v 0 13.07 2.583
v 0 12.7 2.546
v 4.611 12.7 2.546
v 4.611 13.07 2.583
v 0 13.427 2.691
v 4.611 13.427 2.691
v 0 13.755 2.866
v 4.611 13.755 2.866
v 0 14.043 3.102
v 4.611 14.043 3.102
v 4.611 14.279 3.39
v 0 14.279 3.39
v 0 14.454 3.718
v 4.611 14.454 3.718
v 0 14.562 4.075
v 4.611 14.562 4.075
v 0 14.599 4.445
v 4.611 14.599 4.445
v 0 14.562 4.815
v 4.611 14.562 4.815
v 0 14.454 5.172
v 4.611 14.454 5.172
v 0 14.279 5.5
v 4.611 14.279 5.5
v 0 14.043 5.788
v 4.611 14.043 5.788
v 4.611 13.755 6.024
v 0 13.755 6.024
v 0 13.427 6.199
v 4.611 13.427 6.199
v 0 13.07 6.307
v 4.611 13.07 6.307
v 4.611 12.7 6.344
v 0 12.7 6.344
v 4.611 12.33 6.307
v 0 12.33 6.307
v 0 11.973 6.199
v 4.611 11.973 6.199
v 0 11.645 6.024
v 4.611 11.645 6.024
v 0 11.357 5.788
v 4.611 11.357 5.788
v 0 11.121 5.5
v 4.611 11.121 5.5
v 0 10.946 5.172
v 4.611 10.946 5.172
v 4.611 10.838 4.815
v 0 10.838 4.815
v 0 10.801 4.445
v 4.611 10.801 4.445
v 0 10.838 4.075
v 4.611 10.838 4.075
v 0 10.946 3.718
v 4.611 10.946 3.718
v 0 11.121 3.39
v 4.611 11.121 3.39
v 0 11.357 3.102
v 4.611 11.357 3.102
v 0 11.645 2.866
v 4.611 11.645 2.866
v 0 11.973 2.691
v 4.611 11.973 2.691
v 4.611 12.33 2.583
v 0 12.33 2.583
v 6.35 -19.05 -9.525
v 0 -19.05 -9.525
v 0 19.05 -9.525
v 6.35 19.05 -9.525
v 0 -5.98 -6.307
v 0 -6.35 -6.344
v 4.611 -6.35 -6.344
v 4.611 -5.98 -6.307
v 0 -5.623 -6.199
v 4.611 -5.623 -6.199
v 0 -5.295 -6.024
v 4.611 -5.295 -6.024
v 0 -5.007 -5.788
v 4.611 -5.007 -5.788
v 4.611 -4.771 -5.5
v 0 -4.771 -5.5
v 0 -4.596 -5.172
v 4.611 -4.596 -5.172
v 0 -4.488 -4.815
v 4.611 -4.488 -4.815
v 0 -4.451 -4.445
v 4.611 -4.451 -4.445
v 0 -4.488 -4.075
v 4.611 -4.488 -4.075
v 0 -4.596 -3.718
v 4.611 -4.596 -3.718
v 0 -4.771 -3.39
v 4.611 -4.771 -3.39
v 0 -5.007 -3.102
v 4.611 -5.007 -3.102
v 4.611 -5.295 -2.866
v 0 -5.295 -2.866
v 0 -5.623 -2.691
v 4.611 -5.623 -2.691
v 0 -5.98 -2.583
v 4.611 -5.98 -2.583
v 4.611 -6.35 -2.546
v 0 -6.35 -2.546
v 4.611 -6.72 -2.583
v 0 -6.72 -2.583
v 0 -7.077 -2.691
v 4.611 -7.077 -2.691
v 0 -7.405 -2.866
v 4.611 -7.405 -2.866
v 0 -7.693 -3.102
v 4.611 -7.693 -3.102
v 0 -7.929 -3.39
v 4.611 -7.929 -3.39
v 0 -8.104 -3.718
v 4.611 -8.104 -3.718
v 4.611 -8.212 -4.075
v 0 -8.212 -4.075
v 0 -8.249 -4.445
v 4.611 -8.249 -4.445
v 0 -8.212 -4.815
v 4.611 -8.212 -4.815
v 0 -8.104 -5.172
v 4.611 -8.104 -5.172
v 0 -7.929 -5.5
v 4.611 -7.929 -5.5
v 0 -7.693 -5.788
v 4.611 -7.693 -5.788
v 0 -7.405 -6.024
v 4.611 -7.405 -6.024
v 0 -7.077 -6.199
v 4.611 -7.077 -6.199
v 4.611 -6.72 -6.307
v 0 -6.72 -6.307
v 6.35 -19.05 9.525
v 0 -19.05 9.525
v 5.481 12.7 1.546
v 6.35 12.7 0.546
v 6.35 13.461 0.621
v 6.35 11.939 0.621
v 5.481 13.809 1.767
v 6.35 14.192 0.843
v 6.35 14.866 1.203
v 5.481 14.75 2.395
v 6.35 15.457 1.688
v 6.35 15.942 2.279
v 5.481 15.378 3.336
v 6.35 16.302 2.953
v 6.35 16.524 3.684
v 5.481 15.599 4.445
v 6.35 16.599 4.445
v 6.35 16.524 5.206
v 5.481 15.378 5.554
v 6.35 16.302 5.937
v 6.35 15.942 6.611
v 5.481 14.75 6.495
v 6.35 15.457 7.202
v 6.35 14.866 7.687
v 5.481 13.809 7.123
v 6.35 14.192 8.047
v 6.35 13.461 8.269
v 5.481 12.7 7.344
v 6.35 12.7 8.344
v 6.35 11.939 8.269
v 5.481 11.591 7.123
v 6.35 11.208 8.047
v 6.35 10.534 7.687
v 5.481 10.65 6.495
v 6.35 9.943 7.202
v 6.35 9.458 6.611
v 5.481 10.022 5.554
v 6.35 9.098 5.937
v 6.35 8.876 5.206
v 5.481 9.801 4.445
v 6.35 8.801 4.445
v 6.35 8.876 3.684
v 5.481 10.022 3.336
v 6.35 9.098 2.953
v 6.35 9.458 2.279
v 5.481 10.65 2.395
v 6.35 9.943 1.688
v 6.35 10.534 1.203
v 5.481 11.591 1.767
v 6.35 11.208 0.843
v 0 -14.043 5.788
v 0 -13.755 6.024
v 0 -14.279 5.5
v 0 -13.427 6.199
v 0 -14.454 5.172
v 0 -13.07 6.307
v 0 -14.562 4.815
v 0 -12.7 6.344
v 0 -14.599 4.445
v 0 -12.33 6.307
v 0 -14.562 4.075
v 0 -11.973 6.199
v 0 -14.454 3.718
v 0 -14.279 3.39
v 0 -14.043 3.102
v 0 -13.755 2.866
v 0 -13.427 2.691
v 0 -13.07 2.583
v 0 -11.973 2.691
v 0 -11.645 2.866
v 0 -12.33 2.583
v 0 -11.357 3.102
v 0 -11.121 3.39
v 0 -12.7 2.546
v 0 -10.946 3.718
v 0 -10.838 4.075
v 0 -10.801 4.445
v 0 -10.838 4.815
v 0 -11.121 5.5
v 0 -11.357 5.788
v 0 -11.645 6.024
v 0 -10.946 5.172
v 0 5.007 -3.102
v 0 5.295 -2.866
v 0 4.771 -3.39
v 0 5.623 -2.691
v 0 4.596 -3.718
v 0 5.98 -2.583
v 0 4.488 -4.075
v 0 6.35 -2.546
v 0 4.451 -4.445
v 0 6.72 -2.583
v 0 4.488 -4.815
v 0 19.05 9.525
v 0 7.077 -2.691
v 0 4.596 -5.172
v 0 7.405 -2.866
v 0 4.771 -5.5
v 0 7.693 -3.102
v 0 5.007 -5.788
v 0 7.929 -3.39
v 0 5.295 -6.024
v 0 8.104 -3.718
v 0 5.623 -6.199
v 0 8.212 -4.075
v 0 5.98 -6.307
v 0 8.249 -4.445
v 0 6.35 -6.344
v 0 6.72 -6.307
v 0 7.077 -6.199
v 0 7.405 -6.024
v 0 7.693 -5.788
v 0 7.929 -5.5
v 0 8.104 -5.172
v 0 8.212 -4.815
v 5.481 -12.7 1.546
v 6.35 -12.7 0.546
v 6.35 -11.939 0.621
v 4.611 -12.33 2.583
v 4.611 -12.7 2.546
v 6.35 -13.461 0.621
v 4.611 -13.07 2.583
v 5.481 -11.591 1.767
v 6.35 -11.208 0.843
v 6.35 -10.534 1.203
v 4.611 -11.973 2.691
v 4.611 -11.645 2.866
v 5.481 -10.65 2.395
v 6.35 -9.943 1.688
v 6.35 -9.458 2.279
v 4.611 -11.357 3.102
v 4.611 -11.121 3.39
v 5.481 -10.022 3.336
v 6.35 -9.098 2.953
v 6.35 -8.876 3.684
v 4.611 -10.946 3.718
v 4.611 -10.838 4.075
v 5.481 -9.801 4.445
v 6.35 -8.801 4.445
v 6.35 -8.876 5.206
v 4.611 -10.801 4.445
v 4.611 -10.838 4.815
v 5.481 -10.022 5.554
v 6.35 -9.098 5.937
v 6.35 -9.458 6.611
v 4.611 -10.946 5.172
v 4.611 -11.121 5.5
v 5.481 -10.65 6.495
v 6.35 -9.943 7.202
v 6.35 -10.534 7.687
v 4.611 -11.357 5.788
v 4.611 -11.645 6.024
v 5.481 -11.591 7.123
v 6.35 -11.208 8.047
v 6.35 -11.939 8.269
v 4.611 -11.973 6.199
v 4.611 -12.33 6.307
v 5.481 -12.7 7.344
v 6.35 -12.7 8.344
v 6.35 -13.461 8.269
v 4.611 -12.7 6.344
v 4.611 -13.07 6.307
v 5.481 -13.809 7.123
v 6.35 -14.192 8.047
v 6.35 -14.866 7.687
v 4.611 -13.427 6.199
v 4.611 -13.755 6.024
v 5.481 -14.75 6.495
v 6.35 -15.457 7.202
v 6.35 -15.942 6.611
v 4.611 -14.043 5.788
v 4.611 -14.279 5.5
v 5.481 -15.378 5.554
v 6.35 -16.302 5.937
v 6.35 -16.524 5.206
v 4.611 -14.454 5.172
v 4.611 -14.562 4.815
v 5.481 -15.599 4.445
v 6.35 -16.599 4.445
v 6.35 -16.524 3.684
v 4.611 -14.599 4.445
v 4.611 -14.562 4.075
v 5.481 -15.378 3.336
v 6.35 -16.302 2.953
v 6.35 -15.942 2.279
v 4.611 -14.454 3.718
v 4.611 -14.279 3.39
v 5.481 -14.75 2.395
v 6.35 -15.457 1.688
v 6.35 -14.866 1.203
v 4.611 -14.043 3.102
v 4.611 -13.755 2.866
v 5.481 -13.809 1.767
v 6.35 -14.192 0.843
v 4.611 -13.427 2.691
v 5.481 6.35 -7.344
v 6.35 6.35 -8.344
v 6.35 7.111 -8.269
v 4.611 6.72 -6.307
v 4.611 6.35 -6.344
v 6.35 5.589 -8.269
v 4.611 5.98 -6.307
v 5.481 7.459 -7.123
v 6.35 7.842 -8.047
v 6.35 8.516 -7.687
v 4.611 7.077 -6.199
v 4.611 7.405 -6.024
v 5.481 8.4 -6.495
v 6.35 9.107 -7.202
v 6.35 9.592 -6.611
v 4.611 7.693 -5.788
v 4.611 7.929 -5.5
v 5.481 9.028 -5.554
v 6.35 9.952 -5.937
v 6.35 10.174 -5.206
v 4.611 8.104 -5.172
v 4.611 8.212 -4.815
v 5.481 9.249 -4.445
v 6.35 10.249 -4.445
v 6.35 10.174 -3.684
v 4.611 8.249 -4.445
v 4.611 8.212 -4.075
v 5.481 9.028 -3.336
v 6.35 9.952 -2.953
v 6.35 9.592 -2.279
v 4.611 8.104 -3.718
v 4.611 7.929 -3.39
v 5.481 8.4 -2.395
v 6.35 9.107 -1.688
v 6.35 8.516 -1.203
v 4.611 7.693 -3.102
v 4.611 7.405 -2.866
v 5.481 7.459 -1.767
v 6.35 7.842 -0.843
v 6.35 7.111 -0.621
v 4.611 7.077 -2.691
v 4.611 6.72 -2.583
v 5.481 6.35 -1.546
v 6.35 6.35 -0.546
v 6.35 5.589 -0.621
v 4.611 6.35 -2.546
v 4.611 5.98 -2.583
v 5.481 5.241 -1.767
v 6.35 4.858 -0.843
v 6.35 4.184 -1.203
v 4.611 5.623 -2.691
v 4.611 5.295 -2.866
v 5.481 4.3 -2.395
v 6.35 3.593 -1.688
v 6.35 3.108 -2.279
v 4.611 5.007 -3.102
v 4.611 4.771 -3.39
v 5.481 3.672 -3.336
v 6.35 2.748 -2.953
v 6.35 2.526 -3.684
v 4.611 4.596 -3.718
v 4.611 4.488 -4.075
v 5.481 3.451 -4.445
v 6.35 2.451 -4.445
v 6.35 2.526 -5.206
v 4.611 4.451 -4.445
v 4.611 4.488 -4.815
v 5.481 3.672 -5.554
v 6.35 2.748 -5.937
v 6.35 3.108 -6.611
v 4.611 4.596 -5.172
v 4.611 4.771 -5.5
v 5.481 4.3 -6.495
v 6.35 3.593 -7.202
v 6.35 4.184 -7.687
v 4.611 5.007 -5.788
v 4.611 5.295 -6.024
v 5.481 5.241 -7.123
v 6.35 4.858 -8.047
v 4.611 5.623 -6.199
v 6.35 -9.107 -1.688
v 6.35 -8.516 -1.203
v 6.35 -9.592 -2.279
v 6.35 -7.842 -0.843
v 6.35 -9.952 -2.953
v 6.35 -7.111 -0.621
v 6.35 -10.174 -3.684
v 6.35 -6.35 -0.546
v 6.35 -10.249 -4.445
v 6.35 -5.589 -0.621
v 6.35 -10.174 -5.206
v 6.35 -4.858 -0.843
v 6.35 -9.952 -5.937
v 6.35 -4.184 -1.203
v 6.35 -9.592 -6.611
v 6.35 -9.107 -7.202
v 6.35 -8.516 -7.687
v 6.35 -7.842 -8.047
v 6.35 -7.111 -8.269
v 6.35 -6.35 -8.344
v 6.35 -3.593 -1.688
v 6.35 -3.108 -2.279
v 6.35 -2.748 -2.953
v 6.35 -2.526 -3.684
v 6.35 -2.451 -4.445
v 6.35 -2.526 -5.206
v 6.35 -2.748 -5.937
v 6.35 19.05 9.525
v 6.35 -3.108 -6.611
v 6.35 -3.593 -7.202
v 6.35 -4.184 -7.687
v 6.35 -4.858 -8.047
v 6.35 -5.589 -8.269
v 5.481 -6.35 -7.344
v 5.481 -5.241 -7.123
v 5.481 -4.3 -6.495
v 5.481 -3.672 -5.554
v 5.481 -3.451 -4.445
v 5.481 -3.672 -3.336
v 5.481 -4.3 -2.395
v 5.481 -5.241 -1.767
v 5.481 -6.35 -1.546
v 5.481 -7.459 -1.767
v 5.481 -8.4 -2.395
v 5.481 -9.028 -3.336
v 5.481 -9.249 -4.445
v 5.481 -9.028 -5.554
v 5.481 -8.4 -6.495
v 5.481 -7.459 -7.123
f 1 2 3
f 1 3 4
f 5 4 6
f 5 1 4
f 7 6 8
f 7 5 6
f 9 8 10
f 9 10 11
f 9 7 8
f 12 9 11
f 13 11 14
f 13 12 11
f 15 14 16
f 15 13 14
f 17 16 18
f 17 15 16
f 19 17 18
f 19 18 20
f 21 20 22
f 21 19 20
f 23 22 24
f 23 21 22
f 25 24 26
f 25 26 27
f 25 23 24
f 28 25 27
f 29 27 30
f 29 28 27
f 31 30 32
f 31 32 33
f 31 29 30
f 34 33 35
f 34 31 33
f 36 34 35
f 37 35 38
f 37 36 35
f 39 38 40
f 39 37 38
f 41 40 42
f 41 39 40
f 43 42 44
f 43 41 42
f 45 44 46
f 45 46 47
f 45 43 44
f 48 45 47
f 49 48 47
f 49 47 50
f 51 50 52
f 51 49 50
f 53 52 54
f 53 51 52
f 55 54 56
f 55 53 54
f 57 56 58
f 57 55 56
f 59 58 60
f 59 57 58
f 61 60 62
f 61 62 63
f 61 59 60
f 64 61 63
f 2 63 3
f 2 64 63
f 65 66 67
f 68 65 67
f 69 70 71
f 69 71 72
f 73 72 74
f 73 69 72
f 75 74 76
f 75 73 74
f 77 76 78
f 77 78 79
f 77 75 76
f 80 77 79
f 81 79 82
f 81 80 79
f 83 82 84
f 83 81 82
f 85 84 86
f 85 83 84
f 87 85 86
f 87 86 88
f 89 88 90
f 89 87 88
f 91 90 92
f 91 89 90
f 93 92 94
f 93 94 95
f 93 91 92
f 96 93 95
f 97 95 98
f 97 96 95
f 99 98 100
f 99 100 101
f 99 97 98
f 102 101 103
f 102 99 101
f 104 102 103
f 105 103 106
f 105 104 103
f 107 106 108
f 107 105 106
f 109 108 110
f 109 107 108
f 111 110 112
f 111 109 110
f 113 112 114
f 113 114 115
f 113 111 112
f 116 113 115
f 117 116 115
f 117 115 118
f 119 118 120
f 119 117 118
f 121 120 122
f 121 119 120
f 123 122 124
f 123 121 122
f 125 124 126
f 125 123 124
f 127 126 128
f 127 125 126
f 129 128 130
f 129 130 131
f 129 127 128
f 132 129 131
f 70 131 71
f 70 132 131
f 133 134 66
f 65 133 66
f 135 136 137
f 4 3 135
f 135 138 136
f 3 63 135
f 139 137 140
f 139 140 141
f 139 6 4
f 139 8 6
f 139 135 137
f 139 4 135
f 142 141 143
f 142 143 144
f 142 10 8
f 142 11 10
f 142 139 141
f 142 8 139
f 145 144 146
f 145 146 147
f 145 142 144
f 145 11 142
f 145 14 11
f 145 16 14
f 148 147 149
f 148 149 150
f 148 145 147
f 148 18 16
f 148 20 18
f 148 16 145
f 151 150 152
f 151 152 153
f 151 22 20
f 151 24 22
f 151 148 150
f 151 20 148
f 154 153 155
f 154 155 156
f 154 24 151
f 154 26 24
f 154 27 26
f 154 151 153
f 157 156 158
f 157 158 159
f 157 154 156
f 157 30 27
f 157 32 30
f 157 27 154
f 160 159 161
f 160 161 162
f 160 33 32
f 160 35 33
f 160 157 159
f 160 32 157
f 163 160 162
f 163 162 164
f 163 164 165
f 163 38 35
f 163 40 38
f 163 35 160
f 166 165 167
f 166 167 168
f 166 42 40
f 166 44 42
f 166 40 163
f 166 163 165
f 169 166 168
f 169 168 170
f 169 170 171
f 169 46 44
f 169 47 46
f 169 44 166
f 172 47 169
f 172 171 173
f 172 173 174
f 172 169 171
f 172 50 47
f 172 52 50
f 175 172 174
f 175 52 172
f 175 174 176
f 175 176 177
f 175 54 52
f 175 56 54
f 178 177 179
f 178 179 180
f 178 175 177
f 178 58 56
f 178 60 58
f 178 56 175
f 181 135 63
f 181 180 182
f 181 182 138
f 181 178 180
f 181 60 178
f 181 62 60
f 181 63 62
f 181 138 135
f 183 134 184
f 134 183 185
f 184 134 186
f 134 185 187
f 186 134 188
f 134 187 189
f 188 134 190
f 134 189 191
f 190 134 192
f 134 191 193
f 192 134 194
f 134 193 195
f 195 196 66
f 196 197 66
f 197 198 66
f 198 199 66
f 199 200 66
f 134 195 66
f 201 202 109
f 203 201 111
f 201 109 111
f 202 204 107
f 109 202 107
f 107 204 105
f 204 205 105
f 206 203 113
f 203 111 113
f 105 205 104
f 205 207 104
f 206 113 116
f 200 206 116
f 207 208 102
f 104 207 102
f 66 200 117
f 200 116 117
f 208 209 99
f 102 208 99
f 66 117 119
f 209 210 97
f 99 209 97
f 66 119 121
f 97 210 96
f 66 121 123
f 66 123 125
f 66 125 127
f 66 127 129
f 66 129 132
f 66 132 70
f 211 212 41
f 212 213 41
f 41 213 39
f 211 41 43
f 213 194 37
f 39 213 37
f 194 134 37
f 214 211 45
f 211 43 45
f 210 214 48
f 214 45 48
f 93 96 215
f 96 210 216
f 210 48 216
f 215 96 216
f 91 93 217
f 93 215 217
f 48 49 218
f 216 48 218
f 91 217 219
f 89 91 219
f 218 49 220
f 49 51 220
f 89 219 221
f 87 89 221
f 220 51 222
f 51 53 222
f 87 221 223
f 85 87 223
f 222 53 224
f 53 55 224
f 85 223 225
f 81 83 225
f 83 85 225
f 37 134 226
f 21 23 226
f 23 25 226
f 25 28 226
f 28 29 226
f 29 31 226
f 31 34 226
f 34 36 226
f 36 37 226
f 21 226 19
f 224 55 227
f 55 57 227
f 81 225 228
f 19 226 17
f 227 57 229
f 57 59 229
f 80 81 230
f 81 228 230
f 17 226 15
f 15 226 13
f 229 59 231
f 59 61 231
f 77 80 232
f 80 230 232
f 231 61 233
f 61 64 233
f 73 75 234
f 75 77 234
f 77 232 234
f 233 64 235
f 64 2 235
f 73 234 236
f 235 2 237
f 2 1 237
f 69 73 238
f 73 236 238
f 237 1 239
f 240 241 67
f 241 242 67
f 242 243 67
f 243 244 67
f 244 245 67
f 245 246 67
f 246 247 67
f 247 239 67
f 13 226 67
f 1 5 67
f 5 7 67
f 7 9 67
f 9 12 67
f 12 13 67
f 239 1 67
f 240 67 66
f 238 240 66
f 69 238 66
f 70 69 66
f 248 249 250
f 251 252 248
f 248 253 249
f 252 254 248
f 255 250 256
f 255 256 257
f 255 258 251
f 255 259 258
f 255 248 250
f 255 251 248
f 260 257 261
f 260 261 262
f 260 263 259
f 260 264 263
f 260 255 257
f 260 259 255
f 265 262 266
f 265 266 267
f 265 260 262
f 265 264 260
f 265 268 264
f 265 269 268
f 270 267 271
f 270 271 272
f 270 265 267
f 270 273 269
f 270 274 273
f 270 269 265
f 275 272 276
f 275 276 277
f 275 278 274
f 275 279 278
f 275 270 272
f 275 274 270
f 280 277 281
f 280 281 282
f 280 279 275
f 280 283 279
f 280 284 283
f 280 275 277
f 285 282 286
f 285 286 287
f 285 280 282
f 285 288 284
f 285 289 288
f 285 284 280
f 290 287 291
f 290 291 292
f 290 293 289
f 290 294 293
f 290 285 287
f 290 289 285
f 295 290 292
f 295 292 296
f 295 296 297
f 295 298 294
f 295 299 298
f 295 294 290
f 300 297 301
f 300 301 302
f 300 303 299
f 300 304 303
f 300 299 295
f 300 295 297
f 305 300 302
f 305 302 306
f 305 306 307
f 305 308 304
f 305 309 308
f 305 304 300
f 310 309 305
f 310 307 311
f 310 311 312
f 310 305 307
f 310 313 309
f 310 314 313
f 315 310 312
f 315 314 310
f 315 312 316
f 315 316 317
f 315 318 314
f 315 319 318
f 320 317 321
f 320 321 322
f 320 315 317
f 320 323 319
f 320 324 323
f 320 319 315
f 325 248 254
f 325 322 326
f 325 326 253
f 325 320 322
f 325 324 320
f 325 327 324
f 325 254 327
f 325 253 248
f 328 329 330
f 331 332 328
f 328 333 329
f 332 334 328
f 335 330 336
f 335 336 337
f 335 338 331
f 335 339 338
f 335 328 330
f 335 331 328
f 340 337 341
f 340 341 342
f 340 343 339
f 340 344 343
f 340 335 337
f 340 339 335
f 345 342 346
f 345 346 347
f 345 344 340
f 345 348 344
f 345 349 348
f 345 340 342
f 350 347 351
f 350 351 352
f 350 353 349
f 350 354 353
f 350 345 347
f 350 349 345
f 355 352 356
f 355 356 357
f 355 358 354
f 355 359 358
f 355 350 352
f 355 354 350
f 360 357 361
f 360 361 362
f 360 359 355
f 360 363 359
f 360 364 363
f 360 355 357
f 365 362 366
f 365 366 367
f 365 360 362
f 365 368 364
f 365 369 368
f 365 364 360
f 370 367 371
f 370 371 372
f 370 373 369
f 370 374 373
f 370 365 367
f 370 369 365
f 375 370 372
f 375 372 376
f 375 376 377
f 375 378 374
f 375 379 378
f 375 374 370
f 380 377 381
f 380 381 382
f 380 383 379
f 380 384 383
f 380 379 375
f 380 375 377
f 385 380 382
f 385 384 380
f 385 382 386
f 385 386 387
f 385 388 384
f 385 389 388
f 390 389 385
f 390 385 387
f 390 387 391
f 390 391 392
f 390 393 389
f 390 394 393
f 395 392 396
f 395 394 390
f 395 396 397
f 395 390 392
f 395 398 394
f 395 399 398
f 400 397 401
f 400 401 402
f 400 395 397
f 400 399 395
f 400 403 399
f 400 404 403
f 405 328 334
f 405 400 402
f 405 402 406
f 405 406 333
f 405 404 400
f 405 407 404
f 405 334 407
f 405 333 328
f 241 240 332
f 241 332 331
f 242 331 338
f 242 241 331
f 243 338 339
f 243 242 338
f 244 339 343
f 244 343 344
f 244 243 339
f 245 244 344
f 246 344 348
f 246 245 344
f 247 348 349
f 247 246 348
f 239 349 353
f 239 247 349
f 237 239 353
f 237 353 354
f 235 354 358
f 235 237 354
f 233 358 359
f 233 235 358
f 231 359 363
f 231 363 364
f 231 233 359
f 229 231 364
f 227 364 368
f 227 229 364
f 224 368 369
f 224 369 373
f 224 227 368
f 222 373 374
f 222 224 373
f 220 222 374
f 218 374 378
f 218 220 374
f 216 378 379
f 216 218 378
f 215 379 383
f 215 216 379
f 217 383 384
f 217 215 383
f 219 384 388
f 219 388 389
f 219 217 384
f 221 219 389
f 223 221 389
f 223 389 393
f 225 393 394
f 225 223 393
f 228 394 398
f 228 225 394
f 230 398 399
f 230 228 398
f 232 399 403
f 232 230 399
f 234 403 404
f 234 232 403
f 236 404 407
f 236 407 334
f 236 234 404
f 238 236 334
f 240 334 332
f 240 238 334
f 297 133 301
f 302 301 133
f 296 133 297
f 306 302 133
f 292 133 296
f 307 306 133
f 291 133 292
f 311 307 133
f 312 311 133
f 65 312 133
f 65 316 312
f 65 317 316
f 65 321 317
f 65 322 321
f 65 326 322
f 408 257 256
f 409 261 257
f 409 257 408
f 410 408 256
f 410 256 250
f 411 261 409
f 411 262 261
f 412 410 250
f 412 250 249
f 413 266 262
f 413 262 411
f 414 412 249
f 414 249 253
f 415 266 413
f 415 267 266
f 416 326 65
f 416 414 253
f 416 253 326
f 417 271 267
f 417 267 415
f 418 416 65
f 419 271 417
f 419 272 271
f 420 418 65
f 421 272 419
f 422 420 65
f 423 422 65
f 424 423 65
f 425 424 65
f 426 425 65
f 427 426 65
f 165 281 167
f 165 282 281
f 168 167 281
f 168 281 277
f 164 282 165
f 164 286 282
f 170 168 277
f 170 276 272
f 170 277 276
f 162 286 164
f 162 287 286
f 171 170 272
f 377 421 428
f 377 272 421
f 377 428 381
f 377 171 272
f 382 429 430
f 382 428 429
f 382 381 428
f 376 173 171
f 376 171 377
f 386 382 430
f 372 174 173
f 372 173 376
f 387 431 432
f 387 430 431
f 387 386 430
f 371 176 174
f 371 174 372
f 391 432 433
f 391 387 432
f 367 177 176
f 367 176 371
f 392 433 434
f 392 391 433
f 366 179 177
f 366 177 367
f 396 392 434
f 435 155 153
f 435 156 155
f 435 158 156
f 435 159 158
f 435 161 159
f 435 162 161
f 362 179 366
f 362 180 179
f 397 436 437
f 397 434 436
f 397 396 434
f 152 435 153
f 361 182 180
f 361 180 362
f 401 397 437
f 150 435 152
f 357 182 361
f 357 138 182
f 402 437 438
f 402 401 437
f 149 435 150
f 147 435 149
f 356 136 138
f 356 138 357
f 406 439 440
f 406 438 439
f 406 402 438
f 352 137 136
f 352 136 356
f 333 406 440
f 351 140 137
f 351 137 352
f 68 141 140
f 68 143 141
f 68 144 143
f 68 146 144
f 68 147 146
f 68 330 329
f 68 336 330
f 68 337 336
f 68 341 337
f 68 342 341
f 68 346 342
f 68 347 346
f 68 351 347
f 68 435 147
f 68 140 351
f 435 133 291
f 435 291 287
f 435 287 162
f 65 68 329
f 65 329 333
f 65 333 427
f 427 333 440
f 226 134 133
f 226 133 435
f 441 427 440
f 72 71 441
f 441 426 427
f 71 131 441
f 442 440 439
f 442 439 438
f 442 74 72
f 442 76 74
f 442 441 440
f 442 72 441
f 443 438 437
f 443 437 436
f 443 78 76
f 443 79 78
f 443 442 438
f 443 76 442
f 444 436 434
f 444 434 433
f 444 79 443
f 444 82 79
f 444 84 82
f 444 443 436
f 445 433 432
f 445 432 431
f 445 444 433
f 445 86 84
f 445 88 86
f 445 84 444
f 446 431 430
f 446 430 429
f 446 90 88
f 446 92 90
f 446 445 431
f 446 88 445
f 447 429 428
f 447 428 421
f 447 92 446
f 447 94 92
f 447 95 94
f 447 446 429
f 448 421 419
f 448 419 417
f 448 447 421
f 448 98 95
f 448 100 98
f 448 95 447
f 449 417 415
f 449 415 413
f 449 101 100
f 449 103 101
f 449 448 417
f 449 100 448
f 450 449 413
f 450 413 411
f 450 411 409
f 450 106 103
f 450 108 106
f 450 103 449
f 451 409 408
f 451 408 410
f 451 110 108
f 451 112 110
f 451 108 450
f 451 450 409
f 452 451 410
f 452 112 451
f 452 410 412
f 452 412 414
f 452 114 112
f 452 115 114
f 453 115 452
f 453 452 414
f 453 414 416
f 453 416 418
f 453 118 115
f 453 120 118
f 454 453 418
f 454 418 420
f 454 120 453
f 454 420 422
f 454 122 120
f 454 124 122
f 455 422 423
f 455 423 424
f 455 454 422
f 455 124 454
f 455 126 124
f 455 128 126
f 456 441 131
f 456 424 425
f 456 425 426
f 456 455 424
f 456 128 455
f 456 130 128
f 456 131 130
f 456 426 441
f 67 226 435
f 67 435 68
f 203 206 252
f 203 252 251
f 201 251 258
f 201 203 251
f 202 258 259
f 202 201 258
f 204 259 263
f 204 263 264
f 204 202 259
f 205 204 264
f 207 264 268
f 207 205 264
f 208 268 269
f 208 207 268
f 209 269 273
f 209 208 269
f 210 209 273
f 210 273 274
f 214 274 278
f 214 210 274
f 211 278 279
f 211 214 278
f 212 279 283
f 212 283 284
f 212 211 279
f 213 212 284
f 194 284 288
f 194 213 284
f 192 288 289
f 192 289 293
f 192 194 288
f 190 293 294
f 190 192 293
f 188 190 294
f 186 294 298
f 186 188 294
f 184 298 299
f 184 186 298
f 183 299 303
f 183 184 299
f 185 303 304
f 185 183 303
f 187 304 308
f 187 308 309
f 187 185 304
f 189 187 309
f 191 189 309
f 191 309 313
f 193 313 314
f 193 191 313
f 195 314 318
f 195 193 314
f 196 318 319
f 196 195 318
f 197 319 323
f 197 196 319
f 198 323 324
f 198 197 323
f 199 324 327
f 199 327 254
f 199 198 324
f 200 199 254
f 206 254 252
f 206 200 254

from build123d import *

# Parameters (mm, degrees)
SKETCH1_W           = 19.05
SKETCH1_H           = 38.1
SKETCH1_R           = 1.89865
BOSS_EXTRUDE1_DEPTH = 6.35
CHAMFER1_SIZE       = 2.00025
CHAMFER1_SIZE2      = 1.738790797


with BuildPart() as part:
    # Sketch1 → Boss-Extrude1 (new body)
    with BuildSketch(Plane(origin=(0, 0, 0), x_dir=(0, 0, -1), z_dir=(1, 0, 0))):
        Rectangle(SKETCH1_W, SKETCH1_H)
        with Locations((-4.445, 12.7)):
            Circle(SKETCH1_R, mode=Mode.SUBTRACT)
        with Locations((4.445, 6.35)):
            Circle(SKETCH1_R, mode=Mode.SUBTRACT)
        with Locations((-4.445, -12.7)):
            Circle(SKETCH1_R, mode=Mode.SUBTRACT)
        with Locations((4.445, -6.35)):
            Circle(SKETCH1_R, mode=Mode.SUBTRACT)
    extrude(amount=BOSS_EXTRUDE1_DEPTH)

    # Chamfer1
    chamfer1_edges = [part.edges().sort_by_distance(p)[0] for p in [
        (6.35, 12.7, 6.34365),
        (6.35, 6.35, -2.54635),
        (6.35, -12.7, 6.34365),
        (6.35, -6.35, -2.54635),
    ]]
    chamfer1_side = [part.faces().sort_by_distance(p)[0] for p in [
        (6.35, 0, 0),
    ]]
    chamfer(chamfer1_edges, length=CHAMFER1_SIZE, length2=CHAMFER1_SIZE2, reference=chamfer1_side[0])


solid = part.part
